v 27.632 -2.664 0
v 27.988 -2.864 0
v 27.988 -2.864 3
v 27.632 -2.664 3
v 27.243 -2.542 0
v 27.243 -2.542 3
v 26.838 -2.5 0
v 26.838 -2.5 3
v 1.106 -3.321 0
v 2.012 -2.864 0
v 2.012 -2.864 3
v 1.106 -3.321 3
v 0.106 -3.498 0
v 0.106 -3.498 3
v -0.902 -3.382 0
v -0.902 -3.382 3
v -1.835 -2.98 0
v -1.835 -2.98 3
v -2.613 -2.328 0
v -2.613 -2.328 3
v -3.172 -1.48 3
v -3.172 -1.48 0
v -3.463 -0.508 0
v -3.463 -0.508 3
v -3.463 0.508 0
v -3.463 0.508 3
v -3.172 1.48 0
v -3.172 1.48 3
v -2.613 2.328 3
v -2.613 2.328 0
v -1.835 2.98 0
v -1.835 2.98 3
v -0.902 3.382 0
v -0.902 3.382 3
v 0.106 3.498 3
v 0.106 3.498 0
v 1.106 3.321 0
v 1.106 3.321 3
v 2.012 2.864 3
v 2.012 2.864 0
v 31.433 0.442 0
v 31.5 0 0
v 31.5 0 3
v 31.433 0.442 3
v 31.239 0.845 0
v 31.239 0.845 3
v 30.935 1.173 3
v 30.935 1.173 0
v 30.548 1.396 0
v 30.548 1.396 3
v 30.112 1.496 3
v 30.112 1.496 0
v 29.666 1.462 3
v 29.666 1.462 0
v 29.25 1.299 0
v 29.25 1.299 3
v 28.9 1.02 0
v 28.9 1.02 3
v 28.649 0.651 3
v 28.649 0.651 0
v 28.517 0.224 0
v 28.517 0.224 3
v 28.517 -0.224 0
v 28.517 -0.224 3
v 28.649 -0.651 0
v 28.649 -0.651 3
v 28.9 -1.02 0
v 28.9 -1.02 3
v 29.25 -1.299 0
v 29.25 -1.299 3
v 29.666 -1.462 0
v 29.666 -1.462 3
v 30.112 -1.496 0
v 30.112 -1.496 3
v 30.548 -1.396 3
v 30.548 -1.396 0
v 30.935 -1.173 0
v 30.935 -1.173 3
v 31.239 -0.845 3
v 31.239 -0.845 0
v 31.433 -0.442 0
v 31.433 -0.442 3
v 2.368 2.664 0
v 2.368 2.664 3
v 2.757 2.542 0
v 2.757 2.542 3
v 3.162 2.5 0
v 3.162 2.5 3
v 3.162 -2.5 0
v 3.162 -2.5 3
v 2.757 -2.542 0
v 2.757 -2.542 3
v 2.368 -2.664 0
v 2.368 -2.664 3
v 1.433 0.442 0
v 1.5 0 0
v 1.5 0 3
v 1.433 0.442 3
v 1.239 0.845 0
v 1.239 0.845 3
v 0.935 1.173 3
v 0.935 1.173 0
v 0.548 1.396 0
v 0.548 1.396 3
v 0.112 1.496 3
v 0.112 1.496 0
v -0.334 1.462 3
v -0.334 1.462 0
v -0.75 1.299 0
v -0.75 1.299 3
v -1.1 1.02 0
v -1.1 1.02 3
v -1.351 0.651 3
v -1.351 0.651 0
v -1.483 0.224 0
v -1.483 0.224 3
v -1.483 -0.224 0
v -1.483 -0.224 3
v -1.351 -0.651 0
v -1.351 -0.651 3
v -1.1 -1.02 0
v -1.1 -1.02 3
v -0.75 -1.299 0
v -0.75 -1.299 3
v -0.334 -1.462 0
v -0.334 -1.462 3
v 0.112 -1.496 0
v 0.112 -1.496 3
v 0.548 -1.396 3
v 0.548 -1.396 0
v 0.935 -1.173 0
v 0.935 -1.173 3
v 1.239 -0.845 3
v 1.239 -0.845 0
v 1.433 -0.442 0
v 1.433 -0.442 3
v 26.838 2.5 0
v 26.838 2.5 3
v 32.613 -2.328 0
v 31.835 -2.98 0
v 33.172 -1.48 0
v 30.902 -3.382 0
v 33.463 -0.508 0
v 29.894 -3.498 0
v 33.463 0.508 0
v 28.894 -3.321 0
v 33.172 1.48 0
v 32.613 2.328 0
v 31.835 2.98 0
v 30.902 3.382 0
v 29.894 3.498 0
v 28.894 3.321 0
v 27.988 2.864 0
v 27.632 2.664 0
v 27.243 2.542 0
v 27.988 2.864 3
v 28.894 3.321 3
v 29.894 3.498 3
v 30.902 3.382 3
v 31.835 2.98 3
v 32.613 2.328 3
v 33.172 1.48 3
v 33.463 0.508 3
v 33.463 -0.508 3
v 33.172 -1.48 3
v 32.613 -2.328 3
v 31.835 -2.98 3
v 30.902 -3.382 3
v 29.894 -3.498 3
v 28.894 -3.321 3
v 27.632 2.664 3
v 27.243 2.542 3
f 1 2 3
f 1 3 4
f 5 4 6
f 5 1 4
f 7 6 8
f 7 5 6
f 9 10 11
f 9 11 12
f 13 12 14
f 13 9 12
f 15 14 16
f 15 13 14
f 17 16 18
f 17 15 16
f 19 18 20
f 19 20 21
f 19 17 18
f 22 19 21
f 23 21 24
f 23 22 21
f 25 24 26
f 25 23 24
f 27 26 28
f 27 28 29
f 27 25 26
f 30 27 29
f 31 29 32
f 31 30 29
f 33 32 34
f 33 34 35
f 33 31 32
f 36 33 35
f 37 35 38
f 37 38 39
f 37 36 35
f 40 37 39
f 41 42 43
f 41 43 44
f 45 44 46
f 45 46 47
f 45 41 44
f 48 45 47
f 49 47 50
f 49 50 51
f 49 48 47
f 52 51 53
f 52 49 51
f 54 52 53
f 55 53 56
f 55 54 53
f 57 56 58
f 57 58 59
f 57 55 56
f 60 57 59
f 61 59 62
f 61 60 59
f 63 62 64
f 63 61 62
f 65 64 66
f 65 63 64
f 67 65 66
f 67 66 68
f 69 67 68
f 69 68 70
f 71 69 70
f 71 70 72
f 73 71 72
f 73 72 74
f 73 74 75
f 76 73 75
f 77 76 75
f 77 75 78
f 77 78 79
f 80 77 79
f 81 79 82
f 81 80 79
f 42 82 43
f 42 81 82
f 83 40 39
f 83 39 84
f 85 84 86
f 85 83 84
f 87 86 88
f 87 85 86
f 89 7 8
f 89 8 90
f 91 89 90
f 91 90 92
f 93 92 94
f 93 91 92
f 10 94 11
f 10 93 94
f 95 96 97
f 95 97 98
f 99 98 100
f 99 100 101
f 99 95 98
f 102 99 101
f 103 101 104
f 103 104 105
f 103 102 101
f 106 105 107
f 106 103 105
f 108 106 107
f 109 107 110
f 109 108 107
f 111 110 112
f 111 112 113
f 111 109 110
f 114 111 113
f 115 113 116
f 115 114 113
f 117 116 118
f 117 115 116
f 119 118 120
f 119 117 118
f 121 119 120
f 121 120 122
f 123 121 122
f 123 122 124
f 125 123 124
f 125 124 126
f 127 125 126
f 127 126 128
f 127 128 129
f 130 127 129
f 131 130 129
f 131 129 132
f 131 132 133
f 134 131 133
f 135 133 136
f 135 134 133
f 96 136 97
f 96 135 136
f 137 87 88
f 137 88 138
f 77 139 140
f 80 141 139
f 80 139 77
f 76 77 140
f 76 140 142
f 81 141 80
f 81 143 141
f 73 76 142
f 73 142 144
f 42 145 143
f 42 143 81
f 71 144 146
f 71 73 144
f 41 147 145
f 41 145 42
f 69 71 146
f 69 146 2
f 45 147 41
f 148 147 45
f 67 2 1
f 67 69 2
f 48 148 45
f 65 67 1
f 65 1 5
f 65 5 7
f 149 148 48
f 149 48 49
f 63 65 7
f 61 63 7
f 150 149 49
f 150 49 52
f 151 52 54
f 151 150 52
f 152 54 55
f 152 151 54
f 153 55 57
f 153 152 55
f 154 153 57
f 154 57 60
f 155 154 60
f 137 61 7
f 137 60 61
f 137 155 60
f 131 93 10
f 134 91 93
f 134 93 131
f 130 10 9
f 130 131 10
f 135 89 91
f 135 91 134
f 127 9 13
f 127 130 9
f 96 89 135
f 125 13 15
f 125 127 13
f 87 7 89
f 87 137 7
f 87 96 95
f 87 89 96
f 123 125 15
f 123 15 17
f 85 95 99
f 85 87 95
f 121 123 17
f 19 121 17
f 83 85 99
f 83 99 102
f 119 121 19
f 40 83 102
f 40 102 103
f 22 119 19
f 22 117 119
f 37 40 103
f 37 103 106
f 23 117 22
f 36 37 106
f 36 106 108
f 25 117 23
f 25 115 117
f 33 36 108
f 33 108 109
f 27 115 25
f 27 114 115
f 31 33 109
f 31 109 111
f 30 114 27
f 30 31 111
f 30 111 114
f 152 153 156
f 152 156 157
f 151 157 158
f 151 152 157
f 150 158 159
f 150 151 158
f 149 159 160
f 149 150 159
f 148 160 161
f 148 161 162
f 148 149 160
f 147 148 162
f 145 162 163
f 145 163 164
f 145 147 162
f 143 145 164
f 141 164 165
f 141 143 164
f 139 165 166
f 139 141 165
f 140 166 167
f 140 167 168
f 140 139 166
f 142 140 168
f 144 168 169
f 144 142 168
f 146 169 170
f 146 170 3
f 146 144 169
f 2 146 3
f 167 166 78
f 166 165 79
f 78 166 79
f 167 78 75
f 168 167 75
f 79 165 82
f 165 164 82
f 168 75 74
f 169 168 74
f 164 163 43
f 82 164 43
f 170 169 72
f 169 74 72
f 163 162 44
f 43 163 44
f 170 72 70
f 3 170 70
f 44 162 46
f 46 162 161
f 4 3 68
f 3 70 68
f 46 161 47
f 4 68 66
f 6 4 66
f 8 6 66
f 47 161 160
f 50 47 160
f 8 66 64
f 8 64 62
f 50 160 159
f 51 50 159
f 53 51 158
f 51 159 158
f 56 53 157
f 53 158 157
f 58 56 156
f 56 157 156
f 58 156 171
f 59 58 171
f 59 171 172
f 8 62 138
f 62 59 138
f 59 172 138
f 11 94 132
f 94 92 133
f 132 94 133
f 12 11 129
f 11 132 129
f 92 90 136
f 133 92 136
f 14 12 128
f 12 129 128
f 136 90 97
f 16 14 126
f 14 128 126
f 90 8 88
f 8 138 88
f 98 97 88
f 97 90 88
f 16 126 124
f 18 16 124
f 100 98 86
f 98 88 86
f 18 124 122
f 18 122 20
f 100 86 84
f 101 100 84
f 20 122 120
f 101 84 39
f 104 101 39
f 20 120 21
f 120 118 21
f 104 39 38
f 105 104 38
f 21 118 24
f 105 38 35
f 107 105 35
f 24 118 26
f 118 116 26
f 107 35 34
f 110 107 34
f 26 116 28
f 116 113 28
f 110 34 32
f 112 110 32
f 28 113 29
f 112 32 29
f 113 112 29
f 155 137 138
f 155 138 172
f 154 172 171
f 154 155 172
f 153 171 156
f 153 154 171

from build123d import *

# Parameters (mm, degrees)
SKETCH_1_R      = 1.5
EXTRUDE_1_DEPTH = 3


with BuildPart() as part:
    # 草图1 → 凸台-拉伸1 (new body)
    with BuildSketch(Plane.XY):
        with BuildLine():
            Line((3.16227766, 2.5), (26.83772234, 2.5))
            ThreePointArc((26.83772234, 2.5), (27.440745029, 2.593074822), (27.987641489, 2.863636364))
            ThreePointArc((27.987641489, 2.863636364), (33.5, 0), (27.987641489, -2.863636364))
            ThreePointArc((27.987641489, -2.863636364), (27.440745029, -2.593074822), (26.83772234, -2.5))
            Line((26.83772234, -2.5), (3.16227766, -2.5))
            ThreePointArc((3.16227766, -2.5), (2.559254971, -2.593074822), (2.012358511, -2.863636364))
            ThreePointArc((2.012358511, -2.863636364), (-3.5, 0), (2.012358511, 2.863636364))
            ThreePointArc((2.012358511, 2.863636364), (2.559254971, 2.593074822), (3.16227766, 2.5))
        make_face()
        Circle(SKETCH_1_R, mode=Mode.SUBTRACT)
        with Locations((30, 0)):
            Circle(SKETCH_1_R, mode=Mode.SUBTRACT)
    extrude(amount=EXTRUDE_1_DEPTH)


solid = part.part
